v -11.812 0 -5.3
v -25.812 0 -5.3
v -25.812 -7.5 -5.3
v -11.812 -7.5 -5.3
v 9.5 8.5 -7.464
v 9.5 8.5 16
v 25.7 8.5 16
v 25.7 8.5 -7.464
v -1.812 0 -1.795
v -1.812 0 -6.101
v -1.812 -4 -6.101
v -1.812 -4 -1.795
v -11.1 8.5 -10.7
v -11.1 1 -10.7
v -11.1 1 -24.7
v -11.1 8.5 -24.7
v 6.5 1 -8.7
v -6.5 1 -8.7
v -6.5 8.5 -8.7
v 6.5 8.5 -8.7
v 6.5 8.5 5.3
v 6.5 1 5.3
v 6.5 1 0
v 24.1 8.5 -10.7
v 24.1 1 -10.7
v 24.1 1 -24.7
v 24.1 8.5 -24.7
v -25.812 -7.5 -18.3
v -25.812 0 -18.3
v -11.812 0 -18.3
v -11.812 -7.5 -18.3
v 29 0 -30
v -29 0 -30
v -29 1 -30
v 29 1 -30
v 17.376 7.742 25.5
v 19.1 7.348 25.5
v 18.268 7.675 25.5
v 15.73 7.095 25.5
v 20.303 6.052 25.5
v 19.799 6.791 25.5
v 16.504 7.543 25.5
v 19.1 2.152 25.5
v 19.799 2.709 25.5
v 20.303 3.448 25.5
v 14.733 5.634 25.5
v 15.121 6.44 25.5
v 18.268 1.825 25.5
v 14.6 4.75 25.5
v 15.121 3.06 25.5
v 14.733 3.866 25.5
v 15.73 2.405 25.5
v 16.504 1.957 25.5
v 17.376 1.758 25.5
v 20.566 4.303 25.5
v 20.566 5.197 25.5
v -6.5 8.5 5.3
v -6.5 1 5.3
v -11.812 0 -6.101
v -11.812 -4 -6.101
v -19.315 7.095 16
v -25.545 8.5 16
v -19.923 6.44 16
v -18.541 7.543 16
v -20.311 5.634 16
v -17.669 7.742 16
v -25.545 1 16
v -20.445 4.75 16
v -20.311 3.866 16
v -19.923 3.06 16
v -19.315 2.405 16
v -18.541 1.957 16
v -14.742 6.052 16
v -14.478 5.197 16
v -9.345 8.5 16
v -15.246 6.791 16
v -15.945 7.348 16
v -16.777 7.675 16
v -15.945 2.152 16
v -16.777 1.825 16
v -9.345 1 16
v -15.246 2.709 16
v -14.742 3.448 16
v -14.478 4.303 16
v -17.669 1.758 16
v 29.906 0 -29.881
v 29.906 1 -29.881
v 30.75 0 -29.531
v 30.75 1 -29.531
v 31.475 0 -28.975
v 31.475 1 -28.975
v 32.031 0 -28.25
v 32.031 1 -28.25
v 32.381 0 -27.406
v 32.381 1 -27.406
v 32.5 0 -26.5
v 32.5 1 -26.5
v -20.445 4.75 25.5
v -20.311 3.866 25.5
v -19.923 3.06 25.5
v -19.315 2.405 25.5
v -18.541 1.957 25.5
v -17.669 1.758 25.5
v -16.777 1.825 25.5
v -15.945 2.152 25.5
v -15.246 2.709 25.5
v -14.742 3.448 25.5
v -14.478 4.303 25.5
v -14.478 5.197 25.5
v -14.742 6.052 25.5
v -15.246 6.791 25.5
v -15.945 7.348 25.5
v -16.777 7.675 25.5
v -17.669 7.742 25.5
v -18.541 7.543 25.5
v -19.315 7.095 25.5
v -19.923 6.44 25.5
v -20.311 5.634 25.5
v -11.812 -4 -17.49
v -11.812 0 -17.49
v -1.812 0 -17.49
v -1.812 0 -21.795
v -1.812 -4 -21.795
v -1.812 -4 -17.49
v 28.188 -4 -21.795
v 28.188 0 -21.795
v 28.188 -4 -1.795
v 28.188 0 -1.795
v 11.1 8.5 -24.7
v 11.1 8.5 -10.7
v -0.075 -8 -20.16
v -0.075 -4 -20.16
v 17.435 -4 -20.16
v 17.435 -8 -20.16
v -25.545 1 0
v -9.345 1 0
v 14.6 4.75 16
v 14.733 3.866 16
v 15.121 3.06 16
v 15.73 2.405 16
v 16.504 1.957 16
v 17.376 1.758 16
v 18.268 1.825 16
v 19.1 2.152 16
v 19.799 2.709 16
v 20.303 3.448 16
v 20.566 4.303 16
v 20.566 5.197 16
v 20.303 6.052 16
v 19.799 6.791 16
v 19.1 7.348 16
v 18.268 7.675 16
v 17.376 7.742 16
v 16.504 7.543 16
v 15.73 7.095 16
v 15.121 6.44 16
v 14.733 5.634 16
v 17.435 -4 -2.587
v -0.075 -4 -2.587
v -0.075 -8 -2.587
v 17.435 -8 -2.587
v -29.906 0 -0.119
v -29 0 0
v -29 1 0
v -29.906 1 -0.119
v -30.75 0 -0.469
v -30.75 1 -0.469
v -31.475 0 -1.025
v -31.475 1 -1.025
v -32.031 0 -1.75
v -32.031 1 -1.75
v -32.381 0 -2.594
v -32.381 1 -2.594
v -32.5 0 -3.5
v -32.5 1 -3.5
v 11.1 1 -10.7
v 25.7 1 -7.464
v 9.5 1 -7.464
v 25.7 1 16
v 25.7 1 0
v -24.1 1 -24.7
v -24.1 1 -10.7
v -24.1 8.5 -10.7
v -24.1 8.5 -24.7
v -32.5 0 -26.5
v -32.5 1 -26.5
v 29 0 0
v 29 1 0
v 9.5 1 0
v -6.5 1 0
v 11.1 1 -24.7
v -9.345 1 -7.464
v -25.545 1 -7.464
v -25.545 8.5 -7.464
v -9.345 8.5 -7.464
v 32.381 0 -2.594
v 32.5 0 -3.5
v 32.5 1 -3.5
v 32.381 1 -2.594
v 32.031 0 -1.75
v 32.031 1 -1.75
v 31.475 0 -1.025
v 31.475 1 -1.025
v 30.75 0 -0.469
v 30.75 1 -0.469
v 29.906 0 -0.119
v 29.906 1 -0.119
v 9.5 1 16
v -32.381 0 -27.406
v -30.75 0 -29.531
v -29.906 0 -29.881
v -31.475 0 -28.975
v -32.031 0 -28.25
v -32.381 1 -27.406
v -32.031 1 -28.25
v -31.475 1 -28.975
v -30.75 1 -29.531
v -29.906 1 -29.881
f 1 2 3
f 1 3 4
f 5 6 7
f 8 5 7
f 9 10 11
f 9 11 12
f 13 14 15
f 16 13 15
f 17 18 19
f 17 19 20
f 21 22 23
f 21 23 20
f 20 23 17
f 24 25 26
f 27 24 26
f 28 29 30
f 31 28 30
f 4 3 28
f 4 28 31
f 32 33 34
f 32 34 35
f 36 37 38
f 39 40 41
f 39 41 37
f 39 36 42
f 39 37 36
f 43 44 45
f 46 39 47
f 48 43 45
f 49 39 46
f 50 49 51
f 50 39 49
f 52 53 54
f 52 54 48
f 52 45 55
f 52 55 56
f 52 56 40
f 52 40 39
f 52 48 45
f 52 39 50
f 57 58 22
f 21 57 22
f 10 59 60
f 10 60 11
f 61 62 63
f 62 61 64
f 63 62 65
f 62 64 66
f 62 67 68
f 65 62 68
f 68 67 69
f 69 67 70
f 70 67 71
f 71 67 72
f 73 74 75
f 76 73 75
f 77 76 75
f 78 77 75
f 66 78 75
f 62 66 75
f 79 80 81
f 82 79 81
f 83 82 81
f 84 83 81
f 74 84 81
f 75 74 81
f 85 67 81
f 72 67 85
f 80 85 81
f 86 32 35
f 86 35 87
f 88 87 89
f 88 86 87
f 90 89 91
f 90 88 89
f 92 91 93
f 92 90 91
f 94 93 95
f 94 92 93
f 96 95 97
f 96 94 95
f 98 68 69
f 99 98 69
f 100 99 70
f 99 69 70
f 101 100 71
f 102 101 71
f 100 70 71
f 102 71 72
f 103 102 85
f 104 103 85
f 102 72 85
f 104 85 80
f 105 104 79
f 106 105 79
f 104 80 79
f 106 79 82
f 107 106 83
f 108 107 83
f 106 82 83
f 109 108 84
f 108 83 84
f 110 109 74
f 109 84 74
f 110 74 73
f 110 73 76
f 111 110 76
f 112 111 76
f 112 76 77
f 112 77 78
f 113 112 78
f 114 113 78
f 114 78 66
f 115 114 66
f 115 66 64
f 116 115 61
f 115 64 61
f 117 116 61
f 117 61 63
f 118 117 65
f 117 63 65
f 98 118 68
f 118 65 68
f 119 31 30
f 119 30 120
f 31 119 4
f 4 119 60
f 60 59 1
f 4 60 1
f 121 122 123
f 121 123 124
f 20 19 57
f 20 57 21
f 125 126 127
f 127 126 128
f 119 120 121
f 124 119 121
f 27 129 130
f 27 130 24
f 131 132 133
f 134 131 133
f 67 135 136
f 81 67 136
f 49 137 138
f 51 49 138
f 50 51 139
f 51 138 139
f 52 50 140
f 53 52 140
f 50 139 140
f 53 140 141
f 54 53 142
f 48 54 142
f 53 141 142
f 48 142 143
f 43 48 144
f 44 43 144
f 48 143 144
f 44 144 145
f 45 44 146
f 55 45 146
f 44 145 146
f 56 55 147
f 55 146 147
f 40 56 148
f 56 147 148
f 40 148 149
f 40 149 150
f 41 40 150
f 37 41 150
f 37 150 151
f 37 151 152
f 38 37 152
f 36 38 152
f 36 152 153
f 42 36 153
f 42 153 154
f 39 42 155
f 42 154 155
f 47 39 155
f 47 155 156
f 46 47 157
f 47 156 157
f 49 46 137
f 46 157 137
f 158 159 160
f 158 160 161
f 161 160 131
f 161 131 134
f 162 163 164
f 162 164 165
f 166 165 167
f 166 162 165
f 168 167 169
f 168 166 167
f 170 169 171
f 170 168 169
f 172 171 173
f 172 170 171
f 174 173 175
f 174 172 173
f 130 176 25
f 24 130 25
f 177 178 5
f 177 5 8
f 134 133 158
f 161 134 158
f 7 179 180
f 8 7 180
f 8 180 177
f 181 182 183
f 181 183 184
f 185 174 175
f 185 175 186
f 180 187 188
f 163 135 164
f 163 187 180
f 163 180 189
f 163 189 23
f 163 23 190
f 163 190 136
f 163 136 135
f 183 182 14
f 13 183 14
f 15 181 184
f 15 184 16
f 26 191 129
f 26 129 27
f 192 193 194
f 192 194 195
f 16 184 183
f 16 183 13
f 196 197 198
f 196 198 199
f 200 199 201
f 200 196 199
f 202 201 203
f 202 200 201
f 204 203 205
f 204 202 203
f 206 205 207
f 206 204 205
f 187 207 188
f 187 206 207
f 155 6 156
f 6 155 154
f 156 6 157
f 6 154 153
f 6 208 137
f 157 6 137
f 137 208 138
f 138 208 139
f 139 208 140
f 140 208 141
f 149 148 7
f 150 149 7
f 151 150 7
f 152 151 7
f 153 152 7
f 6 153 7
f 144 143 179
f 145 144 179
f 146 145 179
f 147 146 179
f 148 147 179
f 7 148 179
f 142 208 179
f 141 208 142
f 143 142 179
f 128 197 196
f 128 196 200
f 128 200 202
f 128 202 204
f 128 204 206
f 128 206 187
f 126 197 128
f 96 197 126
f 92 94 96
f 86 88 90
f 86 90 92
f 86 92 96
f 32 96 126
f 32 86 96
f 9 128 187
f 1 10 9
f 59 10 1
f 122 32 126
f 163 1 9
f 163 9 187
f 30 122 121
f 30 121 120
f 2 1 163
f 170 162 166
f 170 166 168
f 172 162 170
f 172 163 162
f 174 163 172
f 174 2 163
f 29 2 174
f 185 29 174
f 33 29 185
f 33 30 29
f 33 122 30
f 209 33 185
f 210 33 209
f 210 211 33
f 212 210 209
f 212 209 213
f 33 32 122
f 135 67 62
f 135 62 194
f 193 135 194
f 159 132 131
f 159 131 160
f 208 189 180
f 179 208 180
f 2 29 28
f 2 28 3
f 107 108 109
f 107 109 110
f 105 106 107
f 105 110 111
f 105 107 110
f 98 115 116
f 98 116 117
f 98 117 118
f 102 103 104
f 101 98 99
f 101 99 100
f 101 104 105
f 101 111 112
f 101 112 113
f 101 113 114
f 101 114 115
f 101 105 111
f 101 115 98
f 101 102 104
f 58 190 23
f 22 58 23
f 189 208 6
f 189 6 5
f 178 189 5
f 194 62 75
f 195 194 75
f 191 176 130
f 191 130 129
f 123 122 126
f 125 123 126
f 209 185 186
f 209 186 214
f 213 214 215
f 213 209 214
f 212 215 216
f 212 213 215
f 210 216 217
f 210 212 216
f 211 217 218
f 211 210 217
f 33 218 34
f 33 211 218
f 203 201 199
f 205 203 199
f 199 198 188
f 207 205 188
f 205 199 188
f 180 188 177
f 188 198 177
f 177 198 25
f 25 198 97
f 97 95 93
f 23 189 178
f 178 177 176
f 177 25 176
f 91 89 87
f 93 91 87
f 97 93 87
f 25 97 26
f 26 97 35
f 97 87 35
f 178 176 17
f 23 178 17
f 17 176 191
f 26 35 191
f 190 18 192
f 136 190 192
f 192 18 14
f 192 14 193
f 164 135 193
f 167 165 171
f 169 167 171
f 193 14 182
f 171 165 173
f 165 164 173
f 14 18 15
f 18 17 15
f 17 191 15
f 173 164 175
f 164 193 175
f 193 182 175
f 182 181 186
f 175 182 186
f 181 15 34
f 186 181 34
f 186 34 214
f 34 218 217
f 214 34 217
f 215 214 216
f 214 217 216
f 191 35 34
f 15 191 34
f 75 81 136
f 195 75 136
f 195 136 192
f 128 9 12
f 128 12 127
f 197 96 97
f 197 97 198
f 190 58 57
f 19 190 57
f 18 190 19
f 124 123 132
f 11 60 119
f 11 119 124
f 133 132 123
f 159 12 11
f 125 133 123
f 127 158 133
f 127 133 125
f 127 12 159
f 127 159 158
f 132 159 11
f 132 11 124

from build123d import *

# Parameters (mm, degrees)
BOSS_EXTRUDE1_DEPTH = 1
SKETCH2_W           = 14
SKETCH2_H           = 13
BOSS_EXTRUDE2_DEPTH = 7.5
SKETCH3_W           = 30
SKETCH3_H           = 20
SKETCH3_W_2         = 10
SKETCH3_H_2         = 11.389779098
BOSS_EXTRUDE3_DEPTH = 4
SKETCH5_W           = 17.510242059
SKETCH5_H           = 17.572802037
BOSS_EXTRUDE4_DEPTH = 4
SKETCH6_W           = 13
SKETCH6_H           = 14
BOSS_EXTRUDE5_DEPTH = 7.5
SKETCH7_W           = 16.2
SKETCH7_H           = 23.463684538
BOSS_EXTRUDE6_DEPTH = 7.5
SKETCH8_R           = 3
BOSS_EXTRUDE7_DEPTH = 9.5


with BuildPart() as part:
    # Sketch1 → Boss-Extrude1 (new body)
    with BuildSketch(Plane(origin=(0, 0, 0), x_dir=(1, 0, 0), z_dir=(0, 1, 0))):
        with BuildLine():
            Line((-29, 30), (29, 30))
            ThreePointArc((29, 30), (31.474873734, 28.974873734), (32.5, 26.5))
            Line((32.5, 26.5), (32.5, 3.5))
            ThreePointArc((32.5, 3.5), (31.474873734, 1.025126266), (29, 0))
            Line((29, 0), (-29, 0))
            ThreePointArc((-29, 0), (-31.474873734, 1.025126266), (-32.5, 3.5))
            Line((-32.5, 3.5), (-32.5, 26.5))
            ThreePointArc((-32.5, 26.5), (-31.474873734, 28.974873734), (-29, 30))
        make_face()
    extrude(amount=BOSS_EXTRUDE1_DEPTH)

    # Sketch2 → Boss-Extrude2 (add)
    with BuildSketch(Plane.XZ):
        with Locations((-18.811596296, -11.8)):
            Rectangle(SKETCH2_W, SKETCH2_H)
    extrude(amount=BOSS_EXTRUDE2_DEPTH)

    # Sketch3 → Boss-Extrude3 (add)
    with BuildSketch(Plane.XZ):
        with Locations((13.188403704, -11.795401308)):
            Rectangle(SKETCH3_W, SKETCH3_H)
        with Locations((-6.811596296, -11.795401308)):
            Rectangle(SKETCH3_W_2, SKETCH3_H_2)
    extrude(amount=BOSS_EXTRUDE3_DEPTH)

    # Sketch5 → Boss-Extrude4 (add)
    with BuildSketch(Plane.XZ.offset(4)):
        with Locations((8.67975542, -11.373546029)):
            Rectangle(SKETCH5_W, SKETCH5_H)
    extrude(amount=BOSS_EXTRUDE4_DEPTH)

    # Sketch6 → Boss-Extrude5 (add)
    with BuildSketch(Plane(origin=(0, 1, 0), x_dir=(1, 0, 0), z_dir=(0, 1, 0))):
        with Locations((0, 1.7)):
            Rectangle(SKETCH6_W, SKETCH6_H)
        with Locations((-17.6, 17.7)):
            Rectangle(SKETCH6_W, SKETCH6_H)
        with Locations((17.6, 17.7)):
            Rectangle(SKETCH6_W, SKETCH6_H)
    extrude(amount=BOSS_EXTRUDE5_DEPTH)

    # Sketch7 → Boss-Extrude6 (add)
    with BuildSketch(Plane(origin=(0, 1, 0), x_dir=(1, 0, 0), z_dir=(0, 1, 0))):
        with Locations((-17.444739374, -4.268157731)):
            Rectangle(SKETCH7_W, SKETCH7_H)
        with Locations((17.6, -4.268157731)):
            Rectangle(SKETCH7_W, SKETCH7_H)
    extrude(amount=BOSS_EXTRUDE6_DEPTH)

    # Sketch8 → Boss-Extrude7 (add)
    with BuildSketch(Plane.XY.offset(16)):
        with Locations(Location((-17.444739374, 4.75, 0), (0, 0, 180))):
            Circle(SKETCH8_R)
        with Locations(Location((17.6, 4.75, 0), (0, 0, 180))):
            Circle(SKETCH8_R)
    extrude(amount=BOSS_EXTRUDE7_DEPTH)


solid = part.part
